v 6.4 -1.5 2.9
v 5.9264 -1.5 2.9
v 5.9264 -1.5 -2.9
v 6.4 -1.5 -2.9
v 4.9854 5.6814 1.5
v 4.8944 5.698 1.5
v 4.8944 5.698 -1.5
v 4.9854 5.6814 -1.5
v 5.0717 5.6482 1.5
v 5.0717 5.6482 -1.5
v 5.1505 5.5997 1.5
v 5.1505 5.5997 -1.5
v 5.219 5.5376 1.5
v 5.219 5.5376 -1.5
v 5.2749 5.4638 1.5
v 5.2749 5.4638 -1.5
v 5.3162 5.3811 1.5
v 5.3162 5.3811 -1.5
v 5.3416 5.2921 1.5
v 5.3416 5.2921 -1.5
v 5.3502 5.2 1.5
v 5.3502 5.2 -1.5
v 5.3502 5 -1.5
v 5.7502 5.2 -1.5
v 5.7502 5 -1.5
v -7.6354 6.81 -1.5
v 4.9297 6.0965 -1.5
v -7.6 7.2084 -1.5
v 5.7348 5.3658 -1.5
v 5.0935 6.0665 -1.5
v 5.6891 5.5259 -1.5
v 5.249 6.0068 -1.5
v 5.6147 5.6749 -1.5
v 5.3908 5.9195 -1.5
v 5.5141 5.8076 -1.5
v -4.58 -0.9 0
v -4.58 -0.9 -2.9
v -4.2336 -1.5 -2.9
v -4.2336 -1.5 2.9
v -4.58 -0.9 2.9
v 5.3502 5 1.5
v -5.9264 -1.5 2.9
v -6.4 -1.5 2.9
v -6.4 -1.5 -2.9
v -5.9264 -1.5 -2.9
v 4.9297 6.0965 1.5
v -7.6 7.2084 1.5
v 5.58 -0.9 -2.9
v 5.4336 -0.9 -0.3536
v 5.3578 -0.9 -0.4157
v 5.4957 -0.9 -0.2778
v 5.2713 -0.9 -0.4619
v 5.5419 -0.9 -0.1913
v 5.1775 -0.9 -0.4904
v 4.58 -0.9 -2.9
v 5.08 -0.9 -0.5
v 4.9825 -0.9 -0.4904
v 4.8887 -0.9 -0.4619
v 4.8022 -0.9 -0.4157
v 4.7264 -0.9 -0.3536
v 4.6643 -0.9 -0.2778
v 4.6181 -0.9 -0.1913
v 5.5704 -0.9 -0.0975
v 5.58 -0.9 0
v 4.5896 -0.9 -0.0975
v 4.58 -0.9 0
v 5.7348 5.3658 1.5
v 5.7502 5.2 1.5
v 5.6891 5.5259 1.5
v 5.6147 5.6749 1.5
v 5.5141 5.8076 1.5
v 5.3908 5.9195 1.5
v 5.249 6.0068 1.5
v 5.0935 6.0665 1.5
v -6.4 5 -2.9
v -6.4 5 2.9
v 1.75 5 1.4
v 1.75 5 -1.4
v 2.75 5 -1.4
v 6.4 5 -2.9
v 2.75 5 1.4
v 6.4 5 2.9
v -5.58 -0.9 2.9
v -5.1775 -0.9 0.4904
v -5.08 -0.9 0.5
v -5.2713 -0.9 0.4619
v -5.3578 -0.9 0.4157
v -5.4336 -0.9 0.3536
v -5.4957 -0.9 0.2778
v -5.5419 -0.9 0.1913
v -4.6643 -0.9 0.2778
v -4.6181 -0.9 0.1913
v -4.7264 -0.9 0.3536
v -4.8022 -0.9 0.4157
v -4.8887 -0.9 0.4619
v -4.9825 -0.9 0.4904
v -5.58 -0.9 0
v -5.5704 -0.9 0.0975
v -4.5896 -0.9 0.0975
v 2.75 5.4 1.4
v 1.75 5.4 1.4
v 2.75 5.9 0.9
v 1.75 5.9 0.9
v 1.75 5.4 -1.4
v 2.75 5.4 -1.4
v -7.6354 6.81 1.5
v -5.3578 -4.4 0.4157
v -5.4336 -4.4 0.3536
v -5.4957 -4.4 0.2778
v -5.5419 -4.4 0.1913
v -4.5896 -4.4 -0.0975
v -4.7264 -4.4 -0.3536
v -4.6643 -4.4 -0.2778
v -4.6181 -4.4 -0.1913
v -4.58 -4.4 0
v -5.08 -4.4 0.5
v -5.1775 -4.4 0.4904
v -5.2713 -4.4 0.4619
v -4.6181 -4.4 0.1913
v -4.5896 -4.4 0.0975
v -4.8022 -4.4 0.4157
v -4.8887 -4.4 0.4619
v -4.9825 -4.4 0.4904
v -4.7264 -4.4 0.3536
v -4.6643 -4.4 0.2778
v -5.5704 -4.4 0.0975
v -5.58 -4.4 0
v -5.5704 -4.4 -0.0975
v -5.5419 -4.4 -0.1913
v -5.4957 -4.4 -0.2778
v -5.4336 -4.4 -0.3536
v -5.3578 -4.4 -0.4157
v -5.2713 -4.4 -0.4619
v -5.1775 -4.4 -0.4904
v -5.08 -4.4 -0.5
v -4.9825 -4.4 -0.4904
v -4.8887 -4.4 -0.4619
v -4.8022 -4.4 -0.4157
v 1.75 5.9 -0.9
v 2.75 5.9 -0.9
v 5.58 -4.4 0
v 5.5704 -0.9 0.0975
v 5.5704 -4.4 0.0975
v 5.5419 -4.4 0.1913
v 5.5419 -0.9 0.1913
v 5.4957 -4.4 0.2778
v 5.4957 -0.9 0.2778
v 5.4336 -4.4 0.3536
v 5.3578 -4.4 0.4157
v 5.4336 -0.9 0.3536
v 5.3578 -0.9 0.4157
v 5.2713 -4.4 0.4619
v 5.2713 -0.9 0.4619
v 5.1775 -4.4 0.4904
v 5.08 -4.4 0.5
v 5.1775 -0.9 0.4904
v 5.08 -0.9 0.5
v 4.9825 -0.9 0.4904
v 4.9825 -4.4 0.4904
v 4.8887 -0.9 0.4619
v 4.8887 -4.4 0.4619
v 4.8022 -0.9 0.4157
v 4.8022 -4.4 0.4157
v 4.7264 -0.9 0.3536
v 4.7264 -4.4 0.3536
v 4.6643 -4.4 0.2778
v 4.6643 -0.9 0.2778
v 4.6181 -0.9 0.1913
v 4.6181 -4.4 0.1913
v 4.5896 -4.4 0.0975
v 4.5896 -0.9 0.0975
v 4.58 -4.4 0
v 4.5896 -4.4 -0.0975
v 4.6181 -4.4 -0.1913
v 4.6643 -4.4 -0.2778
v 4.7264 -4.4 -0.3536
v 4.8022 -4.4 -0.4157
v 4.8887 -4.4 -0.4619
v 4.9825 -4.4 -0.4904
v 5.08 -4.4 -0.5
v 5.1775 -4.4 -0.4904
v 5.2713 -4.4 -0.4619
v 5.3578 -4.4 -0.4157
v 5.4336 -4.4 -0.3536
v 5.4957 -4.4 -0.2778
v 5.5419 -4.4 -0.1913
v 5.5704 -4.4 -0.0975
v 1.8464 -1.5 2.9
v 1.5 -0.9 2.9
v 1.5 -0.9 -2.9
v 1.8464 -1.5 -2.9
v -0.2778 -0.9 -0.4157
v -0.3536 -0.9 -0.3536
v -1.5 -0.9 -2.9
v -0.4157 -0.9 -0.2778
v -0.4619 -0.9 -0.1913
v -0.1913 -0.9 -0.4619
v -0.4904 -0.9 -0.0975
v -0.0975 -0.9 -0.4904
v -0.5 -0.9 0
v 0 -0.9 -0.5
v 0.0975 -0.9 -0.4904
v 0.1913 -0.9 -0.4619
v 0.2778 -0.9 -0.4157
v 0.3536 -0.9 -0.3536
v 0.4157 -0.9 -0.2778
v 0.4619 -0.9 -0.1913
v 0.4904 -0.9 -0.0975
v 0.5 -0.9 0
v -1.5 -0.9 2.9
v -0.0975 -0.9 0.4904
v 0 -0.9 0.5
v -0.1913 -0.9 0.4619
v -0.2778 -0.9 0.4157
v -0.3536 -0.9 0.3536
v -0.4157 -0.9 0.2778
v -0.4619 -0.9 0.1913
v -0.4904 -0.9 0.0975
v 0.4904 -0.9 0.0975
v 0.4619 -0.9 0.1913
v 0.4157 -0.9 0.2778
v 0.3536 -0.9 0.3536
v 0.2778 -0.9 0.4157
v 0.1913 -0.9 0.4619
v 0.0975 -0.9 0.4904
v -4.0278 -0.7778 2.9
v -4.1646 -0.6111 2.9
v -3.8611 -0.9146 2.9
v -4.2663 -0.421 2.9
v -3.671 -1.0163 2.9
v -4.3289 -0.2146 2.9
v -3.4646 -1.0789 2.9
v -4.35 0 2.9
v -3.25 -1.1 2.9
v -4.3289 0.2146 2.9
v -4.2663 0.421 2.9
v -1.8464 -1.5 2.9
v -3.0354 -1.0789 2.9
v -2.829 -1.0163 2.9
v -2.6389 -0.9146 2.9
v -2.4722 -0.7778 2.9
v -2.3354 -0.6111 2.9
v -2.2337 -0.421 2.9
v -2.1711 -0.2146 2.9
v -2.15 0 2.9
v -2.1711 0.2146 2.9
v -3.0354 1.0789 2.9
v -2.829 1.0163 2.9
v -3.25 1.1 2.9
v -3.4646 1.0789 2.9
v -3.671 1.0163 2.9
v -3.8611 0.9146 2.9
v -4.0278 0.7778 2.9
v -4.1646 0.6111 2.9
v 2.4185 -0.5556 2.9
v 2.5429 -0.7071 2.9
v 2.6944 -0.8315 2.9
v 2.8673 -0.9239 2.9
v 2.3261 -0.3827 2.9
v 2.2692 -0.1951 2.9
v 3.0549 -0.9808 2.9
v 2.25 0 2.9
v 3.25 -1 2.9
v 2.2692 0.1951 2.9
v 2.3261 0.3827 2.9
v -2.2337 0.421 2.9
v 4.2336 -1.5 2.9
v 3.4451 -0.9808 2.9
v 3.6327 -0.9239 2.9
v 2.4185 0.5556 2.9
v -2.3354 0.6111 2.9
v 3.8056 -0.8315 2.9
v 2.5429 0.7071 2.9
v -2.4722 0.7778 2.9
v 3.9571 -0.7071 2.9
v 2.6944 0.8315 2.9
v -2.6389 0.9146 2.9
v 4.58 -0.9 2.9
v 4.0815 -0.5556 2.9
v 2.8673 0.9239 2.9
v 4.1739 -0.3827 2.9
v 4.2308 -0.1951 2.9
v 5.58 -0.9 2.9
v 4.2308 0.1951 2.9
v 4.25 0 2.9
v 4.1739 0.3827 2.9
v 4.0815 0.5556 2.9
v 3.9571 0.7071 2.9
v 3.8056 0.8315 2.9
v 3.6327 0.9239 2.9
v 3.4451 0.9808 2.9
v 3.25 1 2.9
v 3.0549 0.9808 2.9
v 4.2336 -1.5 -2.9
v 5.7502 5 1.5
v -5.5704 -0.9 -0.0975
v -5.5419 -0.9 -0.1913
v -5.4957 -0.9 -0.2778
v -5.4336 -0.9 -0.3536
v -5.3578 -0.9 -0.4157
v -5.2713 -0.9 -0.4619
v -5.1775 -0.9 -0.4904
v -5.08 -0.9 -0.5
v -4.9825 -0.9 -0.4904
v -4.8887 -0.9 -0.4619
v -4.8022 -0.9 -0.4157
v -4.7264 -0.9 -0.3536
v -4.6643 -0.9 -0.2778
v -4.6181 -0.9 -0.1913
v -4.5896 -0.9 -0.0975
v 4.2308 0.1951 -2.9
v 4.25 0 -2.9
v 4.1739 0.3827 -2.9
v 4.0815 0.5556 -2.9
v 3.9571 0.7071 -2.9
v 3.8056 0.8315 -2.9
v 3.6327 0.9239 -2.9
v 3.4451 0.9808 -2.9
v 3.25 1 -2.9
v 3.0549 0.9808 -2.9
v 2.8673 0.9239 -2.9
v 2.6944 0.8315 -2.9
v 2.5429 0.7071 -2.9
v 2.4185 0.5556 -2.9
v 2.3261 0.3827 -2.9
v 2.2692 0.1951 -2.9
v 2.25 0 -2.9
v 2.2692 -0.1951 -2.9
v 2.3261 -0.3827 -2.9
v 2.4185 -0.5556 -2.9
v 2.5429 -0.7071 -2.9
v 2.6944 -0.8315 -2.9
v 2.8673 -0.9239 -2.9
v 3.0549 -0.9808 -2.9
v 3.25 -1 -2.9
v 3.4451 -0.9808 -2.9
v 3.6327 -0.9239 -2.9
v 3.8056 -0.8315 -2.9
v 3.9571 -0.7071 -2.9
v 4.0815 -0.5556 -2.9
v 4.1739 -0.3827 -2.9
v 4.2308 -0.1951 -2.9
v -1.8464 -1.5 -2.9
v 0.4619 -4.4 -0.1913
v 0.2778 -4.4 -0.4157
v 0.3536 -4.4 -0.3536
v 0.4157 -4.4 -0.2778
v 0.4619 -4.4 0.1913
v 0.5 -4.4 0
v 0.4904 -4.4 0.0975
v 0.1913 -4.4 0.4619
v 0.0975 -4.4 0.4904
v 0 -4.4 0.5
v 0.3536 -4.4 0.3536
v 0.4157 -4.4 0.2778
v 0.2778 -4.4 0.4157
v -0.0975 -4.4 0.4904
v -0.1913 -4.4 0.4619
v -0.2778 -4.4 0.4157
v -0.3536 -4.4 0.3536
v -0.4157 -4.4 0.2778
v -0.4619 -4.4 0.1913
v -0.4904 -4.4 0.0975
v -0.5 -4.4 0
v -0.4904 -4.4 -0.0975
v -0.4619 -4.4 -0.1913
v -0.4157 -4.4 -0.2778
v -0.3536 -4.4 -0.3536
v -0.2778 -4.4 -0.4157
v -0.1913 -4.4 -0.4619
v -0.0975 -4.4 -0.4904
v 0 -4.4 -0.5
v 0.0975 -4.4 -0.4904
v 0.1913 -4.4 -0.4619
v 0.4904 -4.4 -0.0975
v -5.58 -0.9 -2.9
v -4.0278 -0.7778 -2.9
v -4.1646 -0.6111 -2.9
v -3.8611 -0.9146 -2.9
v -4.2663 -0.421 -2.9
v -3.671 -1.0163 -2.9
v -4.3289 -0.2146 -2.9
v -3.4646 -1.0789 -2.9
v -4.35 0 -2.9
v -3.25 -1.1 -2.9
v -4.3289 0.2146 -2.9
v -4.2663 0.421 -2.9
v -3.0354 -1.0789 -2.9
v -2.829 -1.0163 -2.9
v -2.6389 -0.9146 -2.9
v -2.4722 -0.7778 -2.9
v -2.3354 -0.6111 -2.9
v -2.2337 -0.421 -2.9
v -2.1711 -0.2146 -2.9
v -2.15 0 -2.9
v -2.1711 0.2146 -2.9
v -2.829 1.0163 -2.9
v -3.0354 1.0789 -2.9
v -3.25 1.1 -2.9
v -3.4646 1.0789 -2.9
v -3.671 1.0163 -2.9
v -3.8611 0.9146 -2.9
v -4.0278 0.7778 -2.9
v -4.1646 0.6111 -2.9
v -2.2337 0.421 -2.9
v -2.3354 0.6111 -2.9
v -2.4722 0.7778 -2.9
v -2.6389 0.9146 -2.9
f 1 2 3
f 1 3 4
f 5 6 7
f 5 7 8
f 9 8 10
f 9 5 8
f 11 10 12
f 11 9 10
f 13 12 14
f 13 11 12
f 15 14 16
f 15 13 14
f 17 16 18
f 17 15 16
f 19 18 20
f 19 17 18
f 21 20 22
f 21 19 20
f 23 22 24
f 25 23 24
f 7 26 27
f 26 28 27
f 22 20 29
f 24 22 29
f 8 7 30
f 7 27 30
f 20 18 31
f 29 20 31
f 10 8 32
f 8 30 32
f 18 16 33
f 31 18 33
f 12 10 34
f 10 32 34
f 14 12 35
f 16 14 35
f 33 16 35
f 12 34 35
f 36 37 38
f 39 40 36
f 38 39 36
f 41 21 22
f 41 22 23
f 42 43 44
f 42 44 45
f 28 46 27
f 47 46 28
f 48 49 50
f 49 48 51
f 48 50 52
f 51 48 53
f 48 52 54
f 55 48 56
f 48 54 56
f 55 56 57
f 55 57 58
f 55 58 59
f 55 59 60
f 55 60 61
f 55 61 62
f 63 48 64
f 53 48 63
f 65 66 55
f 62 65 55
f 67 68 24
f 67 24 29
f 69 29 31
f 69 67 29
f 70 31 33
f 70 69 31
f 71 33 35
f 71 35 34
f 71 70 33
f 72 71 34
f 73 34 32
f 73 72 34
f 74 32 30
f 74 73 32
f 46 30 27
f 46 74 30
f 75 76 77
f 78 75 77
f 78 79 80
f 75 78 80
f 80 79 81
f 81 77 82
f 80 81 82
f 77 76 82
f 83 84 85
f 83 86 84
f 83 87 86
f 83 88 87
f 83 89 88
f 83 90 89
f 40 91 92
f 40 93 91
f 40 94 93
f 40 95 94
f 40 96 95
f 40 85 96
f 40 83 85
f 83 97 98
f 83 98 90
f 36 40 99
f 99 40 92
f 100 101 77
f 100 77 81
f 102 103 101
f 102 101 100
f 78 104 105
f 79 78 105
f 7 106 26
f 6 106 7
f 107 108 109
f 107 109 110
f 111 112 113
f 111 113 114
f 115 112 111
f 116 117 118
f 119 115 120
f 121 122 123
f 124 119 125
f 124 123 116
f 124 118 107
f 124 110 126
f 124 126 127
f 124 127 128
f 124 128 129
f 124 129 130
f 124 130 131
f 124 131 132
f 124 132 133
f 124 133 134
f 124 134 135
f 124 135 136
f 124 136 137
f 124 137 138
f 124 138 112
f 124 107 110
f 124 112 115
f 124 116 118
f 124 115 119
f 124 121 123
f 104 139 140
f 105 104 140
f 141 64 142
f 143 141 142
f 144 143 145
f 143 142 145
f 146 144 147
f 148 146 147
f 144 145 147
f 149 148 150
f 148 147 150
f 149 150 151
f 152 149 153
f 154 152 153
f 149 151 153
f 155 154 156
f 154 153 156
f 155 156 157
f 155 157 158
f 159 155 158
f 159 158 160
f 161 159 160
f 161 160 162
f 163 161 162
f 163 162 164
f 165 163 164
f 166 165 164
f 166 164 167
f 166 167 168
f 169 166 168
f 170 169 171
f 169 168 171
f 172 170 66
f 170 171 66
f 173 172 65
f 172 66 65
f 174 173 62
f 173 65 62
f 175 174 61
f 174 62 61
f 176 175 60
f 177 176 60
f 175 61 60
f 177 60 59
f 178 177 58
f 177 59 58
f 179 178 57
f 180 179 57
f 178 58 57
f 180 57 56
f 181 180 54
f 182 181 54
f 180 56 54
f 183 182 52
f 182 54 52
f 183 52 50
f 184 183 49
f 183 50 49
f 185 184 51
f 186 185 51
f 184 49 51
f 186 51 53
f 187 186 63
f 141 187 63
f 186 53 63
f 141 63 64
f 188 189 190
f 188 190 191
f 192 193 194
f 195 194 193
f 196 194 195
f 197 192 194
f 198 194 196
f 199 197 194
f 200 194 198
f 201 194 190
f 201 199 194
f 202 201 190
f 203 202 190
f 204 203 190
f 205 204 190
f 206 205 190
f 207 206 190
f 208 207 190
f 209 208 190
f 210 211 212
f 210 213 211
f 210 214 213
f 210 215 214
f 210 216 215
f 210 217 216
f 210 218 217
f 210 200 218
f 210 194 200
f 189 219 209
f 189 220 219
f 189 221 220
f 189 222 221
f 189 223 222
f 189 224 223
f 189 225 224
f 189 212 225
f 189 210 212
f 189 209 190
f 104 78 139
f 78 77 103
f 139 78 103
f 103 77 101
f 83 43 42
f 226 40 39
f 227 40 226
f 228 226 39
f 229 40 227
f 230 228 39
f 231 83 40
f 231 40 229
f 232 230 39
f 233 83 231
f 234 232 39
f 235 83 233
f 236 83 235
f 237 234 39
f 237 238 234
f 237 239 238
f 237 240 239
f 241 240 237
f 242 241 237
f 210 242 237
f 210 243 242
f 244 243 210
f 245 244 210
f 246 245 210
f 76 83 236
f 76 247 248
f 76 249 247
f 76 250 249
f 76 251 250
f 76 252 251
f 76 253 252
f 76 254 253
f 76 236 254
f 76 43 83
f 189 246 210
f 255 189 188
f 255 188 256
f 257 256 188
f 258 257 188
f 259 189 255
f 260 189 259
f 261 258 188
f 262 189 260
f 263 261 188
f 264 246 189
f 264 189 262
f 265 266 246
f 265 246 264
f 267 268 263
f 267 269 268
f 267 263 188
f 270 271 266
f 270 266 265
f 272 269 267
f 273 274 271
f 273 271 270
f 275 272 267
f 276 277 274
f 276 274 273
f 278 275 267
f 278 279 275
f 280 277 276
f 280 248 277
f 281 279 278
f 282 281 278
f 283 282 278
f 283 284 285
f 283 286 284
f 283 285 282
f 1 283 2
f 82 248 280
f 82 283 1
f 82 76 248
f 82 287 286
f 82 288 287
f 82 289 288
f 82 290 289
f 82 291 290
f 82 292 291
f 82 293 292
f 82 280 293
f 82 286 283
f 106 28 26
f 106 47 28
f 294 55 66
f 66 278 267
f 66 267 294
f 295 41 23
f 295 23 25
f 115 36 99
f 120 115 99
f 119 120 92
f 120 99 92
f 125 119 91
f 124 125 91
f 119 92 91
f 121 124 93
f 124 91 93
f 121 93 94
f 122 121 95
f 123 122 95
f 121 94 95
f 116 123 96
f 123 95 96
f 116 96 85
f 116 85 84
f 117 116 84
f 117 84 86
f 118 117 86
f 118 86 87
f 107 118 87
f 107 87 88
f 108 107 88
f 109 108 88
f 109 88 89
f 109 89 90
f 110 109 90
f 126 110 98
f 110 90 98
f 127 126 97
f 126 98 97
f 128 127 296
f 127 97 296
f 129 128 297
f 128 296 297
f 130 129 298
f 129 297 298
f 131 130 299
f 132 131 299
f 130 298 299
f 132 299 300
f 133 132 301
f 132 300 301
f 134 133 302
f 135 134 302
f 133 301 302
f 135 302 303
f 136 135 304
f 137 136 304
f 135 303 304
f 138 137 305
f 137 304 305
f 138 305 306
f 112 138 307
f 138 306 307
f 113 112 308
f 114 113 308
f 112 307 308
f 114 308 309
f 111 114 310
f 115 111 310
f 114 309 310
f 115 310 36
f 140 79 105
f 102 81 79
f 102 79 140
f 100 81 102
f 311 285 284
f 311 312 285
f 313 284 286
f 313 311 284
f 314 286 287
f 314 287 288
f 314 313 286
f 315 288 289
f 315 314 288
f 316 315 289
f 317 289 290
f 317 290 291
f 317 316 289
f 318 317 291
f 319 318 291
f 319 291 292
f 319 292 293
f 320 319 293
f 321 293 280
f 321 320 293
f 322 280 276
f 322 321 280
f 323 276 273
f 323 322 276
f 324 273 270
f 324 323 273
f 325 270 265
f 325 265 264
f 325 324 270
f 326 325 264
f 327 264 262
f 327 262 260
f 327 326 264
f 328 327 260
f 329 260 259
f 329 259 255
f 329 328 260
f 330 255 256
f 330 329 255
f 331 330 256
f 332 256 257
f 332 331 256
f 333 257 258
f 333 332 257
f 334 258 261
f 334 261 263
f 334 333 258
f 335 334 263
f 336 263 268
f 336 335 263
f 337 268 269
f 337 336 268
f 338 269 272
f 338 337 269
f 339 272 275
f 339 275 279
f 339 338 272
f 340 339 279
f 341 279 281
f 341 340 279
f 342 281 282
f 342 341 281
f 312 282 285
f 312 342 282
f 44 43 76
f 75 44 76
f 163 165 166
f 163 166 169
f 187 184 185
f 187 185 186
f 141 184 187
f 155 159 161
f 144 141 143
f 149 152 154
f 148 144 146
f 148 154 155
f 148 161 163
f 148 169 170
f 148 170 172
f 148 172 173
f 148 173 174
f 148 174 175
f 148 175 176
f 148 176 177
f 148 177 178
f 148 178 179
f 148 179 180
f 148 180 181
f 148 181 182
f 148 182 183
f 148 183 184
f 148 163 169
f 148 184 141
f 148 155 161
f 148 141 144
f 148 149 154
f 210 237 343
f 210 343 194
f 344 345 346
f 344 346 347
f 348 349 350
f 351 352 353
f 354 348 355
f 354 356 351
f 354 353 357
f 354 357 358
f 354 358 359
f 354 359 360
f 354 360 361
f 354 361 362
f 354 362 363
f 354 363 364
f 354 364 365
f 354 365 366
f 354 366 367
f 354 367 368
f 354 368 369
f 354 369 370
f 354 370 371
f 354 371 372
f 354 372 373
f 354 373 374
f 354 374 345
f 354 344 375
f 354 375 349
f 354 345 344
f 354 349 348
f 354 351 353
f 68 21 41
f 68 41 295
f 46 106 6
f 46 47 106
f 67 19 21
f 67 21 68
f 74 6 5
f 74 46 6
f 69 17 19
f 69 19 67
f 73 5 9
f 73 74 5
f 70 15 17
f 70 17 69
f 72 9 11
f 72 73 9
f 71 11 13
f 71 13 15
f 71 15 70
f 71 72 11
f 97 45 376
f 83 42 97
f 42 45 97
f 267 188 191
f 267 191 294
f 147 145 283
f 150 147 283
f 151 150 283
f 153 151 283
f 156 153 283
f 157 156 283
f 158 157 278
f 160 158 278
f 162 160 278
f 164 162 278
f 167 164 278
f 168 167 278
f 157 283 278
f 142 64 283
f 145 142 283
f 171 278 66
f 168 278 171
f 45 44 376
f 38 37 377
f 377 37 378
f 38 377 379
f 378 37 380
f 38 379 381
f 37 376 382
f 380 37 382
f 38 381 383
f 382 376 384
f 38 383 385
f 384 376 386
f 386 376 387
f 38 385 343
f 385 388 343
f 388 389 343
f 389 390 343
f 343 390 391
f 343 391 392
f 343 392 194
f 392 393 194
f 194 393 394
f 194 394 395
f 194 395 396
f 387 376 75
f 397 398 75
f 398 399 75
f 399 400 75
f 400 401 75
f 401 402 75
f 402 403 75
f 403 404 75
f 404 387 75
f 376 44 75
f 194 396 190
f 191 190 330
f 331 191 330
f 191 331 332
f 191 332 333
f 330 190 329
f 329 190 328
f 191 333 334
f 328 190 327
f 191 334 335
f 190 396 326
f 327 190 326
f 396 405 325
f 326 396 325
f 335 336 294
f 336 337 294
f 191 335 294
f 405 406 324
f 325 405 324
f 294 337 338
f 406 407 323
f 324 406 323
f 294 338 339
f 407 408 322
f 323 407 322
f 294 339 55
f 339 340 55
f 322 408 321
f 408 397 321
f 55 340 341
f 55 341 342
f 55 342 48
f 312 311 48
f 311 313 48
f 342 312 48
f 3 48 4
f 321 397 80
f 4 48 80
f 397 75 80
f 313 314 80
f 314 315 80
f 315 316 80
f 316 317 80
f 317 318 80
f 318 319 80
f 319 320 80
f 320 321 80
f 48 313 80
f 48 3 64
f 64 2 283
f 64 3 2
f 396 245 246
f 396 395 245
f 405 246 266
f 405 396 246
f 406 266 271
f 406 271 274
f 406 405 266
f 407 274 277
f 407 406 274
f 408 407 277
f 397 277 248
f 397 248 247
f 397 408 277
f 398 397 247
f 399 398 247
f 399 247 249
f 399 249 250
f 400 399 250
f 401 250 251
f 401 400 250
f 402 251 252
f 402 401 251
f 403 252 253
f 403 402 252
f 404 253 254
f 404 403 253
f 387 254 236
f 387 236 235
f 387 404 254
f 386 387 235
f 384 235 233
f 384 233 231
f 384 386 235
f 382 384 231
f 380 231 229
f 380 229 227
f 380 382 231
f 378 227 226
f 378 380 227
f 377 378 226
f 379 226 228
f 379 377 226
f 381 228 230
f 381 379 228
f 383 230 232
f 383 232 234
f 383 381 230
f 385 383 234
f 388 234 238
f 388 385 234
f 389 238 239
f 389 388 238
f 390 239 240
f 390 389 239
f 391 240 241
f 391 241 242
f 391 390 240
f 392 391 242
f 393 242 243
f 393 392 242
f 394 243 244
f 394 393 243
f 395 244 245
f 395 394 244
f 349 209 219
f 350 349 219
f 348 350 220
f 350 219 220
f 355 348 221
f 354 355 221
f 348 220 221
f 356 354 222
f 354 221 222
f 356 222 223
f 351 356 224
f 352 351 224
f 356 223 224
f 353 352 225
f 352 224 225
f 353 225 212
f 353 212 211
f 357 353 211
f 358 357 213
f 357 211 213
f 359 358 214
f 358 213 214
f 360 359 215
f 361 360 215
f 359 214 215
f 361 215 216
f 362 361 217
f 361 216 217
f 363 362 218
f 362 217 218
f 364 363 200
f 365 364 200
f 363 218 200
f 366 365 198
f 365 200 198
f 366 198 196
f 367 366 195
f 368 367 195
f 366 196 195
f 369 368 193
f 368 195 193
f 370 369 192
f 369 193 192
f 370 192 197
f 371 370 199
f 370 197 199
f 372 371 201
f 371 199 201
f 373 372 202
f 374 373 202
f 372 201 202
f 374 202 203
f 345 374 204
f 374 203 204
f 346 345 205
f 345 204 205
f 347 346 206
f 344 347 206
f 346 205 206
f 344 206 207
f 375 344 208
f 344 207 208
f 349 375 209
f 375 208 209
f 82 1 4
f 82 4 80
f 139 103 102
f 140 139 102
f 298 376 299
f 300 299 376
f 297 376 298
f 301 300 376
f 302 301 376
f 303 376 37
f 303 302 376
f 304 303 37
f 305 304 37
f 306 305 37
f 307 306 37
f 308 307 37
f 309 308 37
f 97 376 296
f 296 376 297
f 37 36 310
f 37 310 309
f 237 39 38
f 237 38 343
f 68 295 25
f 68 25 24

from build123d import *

# Parameters (mm, degrees)
SKETCH1_W           = 12.8
SKETCH1_H           = 6.5
SKETCH1_R           = 1.1
SKETCH1_R_2         = 1
BOSS_EXTRUDE1_DEPTH = 2.9
CUT_EXTRUDE4_DEPTH  = 6.8
SKETCH3_W           = 1
SKETCH3_H           = 0.9
BOSS_EXTRUDE2_DEPTH = 1.4
CHAMFER1_SIZE       = 0.5
SKETCH13_R          = 0.5
BOSS_EXTRUDE9_DEPTH = 3.5
BOSS_EXTRUDE8_DEPTH = 1.5


with BuildPart() as part:
    # Sketch1 → Boss-Extrude1 (new body, symmetric)
    with BuildSketch(Plane.XY):
        with Locations((0, 1.75)):
            Rectangle(SKETCH1_W, SKETCH1_H)
        with Locations((-3.25, 0)):
            Circle(SKETCH1_R, mode=Mode.SUBTRACT)
        with Locations((3.25, 0)):
            Circle(SKETCH1_R_2, mode=Mode.SUBTRACT)
    extrude(amount=BOSS_EXTRUDE1_DEPTH, both=True)

    # Sketch12 → Cut-Extrude4 (cut, through all)
    with BuildSketch(Plane.XY.offset(2.9)):
        Polygon((-1.846410162, -1.5), (-1.5, -0.9), (1.5, -0.9), (1.846410162, -1.5), align=None)
        Polygon((-5.926410162, -1.5), (-5.58, -0.9), (-4.58, -0.9), (-4.233589838, -1.5), align=None)
        Polygon((4.233589838, -1.5), (5.926410162, -1.5), (5.58, -0.9), (4.58, -0.9), align=None)
    extrude(amount=-CUT_EXTRUDE4_DEPTH, mode=Mode.SUBTRACT)

    # Sketch3 → Boss-Extrude2 (add, symmetric)
    with BuildSketch(Plane.XY):
        with Locations((2.25, 5.45)):
            Rectangle(SKETCH3_W, SKETCH3_H)
    extrude(amount=BOSS_EXTRUDE2_DEPTH, both=True)

    # Chamfer1
    chamfer1_edges = [part.edges().sort_by_distance(p)[0] for p in [
        (2.25, 5.9, -1.4),
        (2.25, 5.9, 1.4),
    ]]
    chamfer(chamfer1_edges, length=CHAMFER1_SIZE)

    # Sketch13 → Boss-Extrude9 (add)
    with BuildSketch(Plane.XZ.offset(0.9)):
        Circle(SKETCH13_R)
        with Locations((-5.08, 0)):
            Circle(SKETCH13_R)
        with Locations((5.08, 0)):
            Circle(SKETCH13_R)
    extrude(amount=BOSS_EXTRUDE9_DEPTH)


with BuildPart() as body_2:
    # Sketch11 → Boss-Extrude8 (new body, symmetric)
    with BuildSketch(Plane.XY):
        with BuildLine():
            Line((-7.635359223, 6.81), (4.894376977, 5.698042615))
            ThreePointArc((4.894376977, 5.698042615), (5.219027182, 5.537565168), (5.350177949, 5.2))
            Line((5.350177949, 5.2), (5.350177949, 5))
            Line((5.350177949, 5), (5.750177949, 5))
            Line((5.750177949, 5), (5.750177949, 5.2))
            ThreePointArc((5.750177949, 5.2), (5.514106569, 5.807617303), (4.929736199, 6.096476706))
            Line((4.929736199, 6.096476706), (-7.6, 7.208434092))
            Line((-7.6, 7.208434092), (-7.635359223, 6.81))
        make_face()
    extrude(amount=BOSS_EXTRUDE8_DEPTH, both=True)


solid = Compound([part.part, body_2.part])
